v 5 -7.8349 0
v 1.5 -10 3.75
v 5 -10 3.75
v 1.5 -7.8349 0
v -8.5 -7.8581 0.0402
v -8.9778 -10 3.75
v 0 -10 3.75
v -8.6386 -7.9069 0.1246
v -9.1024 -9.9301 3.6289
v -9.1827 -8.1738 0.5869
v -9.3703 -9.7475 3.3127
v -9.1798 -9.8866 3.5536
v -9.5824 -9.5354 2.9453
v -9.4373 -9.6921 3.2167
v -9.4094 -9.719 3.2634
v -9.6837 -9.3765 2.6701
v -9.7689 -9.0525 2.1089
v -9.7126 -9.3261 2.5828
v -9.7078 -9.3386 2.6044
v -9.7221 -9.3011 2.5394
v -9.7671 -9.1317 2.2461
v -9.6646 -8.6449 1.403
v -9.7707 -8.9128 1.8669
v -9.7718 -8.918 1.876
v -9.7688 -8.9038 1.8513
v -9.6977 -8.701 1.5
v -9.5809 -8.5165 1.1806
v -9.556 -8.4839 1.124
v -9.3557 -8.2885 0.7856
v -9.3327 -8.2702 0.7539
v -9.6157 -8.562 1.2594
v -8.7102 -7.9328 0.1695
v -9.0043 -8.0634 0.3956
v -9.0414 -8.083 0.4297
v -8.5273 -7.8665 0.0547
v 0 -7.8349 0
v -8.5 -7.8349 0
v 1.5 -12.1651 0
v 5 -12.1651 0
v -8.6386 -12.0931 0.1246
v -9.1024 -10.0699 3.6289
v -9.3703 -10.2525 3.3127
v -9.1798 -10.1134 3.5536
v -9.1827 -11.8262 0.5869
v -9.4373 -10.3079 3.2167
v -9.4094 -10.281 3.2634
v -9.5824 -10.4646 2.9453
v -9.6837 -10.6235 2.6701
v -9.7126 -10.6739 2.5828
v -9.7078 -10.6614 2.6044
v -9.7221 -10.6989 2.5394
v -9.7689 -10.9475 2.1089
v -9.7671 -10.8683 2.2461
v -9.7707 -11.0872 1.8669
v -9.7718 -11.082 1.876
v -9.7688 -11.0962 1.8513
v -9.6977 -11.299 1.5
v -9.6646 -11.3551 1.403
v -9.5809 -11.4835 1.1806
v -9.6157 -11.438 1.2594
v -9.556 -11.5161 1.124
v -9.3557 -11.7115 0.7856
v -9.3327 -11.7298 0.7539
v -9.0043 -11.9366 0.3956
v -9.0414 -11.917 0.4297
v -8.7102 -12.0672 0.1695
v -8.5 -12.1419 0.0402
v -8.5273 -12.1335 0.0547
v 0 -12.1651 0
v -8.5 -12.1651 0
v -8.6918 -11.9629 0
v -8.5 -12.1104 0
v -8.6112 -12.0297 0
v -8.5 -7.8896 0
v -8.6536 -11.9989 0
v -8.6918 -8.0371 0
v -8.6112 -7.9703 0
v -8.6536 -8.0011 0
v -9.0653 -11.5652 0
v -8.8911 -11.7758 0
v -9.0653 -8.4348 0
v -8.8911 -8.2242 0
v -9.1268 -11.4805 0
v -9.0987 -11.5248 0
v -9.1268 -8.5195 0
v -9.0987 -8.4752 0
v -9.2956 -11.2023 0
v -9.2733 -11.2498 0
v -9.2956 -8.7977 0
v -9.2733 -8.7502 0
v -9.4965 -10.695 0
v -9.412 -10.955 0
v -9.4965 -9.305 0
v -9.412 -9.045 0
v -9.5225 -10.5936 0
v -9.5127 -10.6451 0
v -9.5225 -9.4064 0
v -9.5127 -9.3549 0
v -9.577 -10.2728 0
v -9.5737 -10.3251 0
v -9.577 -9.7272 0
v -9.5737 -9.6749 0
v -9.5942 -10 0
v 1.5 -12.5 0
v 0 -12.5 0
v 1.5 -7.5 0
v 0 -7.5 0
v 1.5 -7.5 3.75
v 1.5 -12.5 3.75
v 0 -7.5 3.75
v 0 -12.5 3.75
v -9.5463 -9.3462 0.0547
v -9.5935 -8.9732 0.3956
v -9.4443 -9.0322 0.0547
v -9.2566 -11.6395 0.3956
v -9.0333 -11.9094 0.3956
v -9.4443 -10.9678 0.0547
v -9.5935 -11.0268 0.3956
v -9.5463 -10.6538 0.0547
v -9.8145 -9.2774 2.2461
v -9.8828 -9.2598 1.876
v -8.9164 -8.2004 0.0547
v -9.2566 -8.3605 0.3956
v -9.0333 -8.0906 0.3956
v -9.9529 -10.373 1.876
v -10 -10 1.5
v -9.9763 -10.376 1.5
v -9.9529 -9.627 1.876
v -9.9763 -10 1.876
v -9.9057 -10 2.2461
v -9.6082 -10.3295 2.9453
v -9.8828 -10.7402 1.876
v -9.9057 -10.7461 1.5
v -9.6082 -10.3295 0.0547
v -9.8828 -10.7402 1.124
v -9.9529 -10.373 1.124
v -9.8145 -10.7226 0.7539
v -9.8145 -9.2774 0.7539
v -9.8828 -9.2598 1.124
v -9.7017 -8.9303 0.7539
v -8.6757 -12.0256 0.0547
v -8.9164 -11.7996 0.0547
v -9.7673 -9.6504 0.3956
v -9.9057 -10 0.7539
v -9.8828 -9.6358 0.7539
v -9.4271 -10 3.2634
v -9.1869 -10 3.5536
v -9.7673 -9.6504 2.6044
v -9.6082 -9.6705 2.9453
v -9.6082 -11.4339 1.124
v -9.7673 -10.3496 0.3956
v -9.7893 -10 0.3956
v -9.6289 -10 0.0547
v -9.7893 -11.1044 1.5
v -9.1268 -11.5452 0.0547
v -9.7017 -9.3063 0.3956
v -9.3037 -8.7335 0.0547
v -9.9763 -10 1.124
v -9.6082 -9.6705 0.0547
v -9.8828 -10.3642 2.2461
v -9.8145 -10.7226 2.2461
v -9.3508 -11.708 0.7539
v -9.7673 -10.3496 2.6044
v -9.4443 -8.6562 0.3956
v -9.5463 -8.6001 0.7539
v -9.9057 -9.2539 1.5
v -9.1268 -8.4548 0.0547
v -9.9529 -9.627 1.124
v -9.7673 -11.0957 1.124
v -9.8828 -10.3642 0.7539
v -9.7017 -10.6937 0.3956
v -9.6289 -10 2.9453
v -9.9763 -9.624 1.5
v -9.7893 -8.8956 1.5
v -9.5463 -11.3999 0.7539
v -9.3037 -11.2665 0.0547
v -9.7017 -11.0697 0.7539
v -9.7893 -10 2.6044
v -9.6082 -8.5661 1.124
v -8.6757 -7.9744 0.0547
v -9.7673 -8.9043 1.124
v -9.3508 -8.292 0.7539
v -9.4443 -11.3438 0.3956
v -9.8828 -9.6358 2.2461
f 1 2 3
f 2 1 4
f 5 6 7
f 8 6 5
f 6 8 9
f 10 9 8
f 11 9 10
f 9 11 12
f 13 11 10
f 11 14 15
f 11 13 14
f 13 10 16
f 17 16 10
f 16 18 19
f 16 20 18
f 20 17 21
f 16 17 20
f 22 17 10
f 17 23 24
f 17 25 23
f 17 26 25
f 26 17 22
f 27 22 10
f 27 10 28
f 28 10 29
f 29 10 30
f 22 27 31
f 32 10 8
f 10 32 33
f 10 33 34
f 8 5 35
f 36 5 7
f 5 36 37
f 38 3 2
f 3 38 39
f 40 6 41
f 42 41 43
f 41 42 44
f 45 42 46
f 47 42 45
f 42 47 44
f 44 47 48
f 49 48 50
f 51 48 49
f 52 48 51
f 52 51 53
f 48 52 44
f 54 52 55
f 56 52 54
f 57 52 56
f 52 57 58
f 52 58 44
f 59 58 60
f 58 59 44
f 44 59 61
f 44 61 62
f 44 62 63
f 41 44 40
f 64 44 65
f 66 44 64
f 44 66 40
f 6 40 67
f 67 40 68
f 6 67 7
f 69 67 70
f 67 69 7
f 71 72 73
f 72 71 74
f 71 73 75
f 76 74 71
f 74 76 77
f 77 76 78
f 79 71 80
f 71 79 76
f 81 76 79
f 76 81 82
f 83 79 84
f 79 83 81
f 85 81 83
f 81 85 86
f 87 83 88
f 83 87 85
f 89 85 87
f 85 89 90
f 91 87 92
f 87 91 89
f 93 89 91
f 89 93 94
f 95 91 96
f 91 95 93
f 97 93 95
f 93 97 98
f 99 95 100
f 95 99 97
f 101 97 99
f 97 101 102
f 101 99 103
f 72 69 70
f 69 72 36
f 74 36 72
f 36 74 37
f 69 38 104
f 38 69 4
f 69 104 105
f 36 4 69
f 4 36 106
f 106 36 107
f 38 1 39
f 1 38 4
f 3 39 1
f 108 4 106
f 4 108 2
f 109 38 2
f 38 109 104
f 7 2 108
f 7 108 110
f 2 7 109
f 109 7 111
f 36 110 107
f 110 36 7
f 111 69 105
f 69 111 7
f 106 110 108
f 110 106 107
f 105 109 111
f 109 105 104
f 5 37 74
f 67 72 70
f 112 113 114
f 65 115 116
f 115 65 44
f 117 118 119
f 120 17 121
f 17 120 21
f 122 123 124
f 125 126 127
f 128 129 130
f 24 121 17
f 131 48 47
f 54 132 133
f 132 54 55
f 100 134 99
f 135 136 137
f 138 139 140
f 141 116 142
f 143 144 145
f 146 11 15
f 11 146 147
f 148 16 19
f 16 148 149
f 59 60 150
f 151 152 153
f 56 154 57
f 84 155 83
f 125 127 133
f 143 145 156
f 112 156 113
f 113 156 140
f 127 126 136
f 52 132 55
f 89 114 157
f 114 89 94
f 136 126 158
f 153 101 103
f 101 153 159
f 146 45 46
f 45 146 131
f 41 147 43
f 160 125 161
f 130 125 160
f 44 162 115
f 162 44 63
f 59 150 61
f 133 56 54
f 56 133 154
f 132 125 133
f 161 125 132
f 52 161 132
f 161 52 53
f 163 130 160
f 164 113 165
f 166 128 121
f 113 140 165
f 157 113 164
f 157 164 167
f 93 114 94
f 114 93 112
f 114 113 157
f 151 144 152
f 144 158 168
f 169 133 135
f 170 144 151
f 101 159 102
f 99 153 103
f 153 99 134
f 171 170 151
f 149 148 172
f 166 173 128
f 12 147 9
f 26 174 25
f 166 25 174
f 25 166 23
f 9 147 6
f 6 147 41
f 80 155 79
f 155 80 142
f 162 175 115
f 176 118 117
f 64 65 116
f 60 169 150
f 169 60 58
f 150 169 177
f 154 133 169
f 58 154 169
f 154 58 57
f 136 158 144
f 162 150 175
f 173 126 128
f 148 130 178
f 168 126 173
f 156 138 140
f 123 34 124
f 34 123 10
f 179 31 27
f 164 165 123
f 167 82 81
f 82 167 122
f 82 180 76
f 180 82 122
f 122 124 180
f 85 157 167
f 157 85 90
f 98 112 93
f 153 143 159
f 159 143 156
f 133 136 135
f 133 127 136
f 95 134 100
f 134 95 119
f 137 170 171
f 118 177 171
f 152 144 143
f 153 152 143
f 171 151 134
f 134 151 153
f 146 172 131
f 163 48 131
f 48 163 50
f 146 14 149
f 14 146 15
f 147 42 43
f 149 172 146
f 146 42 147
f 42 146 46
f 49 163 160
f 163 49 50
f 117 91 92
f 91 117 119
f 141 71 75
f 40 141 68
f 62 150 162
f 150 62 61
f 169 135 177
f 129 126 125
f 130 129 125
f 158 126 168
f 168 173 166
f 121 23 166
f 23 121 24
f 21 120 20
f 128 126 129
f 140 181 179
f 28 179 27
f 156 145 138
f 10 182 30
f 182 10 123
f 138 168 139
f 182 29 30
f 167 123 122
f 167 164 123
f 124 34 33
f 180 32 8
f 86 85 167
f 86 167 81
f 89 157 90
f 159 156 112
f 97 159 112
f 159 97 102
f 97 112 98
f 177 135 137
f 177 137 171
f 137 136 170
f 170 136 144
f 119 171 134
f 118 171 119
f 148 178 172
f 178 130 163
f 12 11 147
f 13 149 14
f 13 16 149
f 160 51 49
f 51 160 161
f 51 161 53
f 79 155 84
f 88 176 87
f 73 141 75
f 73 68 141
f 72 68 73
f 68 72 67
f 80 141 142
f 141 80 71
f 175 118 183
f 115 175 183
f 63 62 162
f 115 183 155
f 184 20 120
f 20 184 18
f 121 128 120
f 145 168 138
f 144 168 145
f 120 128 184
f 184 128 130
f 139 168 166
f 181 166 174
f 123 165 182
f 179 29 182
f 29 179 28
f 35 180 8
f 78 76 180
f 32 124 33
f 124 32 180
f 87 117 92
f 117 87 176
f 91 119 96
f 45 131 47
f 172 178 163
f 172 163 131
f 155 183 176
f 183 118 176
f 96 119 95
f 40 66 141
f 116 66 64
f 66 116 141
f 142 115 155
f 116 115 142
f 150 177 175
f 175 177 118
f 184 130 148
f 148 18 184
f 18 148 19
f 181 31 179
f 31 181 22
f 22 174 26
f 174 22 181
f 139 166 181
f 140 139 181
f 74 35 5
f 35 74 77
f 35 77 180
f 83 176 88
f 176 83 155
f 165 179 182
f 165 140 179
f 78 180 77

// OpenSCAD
// file: coax_sizes.scad
// hole radius for the pen
pen_hole_r = 6;

// outside radius of the tall center shaft.
ctr_outside_r = 8;
ctr_bottom_r = 16;
ctr_bottom_h = 3.5;

ring_outside_r = 10;
ring_body_w = 14.5;
ring_body_d = 7;
//ring_body_h = 15;
ring_cutout_d = 3.5;

nut_depth = 3.5;
nut_width = 9.8;

legs = 3;
leg_r = 2.5;
leg_h = 15;
leg_offset = 12;

nubs = 2;
nub_r = 1.25;

ring_h = 13;

rod_r = 2.7;
rod_up_from_base = 5;
// main file
include <coax_sizes.scad>

module coax_leg() {
        difference() {
                union() {
                        translate([5, 0, leg_r/2])
                                rotate([0, -90, 0]) {
                        	cylinder(h = leg_h, r = leg_r, center = false, $fn=3);
                        }
                        translate([0, -leg_r, 0])
                                cube([1.5, leg_r * 2, leg_r * 1.5], false);
                }

                // round the end
                difference() {
                        translate([-7 - leg_r * 1.2, 0, leg_r * 1.2 / 2])
                                cube([leg_r * 1.2, leg_r * 1.2 * 2, leg_r * 1.2 * 2], true);
                        translate([-7, 0, leg_r * 1.2 / 2])
                                sphere(leg_r * 1.2, $fn=50);
                }
        }
}

module coax_legs () {
        union() {
                for(i = [1 : 1]) {
                        translate([0, 10 * i - (legs / 1.5) * 10, 0]) coax_leg();
                }
        }
}

coax_legs();
